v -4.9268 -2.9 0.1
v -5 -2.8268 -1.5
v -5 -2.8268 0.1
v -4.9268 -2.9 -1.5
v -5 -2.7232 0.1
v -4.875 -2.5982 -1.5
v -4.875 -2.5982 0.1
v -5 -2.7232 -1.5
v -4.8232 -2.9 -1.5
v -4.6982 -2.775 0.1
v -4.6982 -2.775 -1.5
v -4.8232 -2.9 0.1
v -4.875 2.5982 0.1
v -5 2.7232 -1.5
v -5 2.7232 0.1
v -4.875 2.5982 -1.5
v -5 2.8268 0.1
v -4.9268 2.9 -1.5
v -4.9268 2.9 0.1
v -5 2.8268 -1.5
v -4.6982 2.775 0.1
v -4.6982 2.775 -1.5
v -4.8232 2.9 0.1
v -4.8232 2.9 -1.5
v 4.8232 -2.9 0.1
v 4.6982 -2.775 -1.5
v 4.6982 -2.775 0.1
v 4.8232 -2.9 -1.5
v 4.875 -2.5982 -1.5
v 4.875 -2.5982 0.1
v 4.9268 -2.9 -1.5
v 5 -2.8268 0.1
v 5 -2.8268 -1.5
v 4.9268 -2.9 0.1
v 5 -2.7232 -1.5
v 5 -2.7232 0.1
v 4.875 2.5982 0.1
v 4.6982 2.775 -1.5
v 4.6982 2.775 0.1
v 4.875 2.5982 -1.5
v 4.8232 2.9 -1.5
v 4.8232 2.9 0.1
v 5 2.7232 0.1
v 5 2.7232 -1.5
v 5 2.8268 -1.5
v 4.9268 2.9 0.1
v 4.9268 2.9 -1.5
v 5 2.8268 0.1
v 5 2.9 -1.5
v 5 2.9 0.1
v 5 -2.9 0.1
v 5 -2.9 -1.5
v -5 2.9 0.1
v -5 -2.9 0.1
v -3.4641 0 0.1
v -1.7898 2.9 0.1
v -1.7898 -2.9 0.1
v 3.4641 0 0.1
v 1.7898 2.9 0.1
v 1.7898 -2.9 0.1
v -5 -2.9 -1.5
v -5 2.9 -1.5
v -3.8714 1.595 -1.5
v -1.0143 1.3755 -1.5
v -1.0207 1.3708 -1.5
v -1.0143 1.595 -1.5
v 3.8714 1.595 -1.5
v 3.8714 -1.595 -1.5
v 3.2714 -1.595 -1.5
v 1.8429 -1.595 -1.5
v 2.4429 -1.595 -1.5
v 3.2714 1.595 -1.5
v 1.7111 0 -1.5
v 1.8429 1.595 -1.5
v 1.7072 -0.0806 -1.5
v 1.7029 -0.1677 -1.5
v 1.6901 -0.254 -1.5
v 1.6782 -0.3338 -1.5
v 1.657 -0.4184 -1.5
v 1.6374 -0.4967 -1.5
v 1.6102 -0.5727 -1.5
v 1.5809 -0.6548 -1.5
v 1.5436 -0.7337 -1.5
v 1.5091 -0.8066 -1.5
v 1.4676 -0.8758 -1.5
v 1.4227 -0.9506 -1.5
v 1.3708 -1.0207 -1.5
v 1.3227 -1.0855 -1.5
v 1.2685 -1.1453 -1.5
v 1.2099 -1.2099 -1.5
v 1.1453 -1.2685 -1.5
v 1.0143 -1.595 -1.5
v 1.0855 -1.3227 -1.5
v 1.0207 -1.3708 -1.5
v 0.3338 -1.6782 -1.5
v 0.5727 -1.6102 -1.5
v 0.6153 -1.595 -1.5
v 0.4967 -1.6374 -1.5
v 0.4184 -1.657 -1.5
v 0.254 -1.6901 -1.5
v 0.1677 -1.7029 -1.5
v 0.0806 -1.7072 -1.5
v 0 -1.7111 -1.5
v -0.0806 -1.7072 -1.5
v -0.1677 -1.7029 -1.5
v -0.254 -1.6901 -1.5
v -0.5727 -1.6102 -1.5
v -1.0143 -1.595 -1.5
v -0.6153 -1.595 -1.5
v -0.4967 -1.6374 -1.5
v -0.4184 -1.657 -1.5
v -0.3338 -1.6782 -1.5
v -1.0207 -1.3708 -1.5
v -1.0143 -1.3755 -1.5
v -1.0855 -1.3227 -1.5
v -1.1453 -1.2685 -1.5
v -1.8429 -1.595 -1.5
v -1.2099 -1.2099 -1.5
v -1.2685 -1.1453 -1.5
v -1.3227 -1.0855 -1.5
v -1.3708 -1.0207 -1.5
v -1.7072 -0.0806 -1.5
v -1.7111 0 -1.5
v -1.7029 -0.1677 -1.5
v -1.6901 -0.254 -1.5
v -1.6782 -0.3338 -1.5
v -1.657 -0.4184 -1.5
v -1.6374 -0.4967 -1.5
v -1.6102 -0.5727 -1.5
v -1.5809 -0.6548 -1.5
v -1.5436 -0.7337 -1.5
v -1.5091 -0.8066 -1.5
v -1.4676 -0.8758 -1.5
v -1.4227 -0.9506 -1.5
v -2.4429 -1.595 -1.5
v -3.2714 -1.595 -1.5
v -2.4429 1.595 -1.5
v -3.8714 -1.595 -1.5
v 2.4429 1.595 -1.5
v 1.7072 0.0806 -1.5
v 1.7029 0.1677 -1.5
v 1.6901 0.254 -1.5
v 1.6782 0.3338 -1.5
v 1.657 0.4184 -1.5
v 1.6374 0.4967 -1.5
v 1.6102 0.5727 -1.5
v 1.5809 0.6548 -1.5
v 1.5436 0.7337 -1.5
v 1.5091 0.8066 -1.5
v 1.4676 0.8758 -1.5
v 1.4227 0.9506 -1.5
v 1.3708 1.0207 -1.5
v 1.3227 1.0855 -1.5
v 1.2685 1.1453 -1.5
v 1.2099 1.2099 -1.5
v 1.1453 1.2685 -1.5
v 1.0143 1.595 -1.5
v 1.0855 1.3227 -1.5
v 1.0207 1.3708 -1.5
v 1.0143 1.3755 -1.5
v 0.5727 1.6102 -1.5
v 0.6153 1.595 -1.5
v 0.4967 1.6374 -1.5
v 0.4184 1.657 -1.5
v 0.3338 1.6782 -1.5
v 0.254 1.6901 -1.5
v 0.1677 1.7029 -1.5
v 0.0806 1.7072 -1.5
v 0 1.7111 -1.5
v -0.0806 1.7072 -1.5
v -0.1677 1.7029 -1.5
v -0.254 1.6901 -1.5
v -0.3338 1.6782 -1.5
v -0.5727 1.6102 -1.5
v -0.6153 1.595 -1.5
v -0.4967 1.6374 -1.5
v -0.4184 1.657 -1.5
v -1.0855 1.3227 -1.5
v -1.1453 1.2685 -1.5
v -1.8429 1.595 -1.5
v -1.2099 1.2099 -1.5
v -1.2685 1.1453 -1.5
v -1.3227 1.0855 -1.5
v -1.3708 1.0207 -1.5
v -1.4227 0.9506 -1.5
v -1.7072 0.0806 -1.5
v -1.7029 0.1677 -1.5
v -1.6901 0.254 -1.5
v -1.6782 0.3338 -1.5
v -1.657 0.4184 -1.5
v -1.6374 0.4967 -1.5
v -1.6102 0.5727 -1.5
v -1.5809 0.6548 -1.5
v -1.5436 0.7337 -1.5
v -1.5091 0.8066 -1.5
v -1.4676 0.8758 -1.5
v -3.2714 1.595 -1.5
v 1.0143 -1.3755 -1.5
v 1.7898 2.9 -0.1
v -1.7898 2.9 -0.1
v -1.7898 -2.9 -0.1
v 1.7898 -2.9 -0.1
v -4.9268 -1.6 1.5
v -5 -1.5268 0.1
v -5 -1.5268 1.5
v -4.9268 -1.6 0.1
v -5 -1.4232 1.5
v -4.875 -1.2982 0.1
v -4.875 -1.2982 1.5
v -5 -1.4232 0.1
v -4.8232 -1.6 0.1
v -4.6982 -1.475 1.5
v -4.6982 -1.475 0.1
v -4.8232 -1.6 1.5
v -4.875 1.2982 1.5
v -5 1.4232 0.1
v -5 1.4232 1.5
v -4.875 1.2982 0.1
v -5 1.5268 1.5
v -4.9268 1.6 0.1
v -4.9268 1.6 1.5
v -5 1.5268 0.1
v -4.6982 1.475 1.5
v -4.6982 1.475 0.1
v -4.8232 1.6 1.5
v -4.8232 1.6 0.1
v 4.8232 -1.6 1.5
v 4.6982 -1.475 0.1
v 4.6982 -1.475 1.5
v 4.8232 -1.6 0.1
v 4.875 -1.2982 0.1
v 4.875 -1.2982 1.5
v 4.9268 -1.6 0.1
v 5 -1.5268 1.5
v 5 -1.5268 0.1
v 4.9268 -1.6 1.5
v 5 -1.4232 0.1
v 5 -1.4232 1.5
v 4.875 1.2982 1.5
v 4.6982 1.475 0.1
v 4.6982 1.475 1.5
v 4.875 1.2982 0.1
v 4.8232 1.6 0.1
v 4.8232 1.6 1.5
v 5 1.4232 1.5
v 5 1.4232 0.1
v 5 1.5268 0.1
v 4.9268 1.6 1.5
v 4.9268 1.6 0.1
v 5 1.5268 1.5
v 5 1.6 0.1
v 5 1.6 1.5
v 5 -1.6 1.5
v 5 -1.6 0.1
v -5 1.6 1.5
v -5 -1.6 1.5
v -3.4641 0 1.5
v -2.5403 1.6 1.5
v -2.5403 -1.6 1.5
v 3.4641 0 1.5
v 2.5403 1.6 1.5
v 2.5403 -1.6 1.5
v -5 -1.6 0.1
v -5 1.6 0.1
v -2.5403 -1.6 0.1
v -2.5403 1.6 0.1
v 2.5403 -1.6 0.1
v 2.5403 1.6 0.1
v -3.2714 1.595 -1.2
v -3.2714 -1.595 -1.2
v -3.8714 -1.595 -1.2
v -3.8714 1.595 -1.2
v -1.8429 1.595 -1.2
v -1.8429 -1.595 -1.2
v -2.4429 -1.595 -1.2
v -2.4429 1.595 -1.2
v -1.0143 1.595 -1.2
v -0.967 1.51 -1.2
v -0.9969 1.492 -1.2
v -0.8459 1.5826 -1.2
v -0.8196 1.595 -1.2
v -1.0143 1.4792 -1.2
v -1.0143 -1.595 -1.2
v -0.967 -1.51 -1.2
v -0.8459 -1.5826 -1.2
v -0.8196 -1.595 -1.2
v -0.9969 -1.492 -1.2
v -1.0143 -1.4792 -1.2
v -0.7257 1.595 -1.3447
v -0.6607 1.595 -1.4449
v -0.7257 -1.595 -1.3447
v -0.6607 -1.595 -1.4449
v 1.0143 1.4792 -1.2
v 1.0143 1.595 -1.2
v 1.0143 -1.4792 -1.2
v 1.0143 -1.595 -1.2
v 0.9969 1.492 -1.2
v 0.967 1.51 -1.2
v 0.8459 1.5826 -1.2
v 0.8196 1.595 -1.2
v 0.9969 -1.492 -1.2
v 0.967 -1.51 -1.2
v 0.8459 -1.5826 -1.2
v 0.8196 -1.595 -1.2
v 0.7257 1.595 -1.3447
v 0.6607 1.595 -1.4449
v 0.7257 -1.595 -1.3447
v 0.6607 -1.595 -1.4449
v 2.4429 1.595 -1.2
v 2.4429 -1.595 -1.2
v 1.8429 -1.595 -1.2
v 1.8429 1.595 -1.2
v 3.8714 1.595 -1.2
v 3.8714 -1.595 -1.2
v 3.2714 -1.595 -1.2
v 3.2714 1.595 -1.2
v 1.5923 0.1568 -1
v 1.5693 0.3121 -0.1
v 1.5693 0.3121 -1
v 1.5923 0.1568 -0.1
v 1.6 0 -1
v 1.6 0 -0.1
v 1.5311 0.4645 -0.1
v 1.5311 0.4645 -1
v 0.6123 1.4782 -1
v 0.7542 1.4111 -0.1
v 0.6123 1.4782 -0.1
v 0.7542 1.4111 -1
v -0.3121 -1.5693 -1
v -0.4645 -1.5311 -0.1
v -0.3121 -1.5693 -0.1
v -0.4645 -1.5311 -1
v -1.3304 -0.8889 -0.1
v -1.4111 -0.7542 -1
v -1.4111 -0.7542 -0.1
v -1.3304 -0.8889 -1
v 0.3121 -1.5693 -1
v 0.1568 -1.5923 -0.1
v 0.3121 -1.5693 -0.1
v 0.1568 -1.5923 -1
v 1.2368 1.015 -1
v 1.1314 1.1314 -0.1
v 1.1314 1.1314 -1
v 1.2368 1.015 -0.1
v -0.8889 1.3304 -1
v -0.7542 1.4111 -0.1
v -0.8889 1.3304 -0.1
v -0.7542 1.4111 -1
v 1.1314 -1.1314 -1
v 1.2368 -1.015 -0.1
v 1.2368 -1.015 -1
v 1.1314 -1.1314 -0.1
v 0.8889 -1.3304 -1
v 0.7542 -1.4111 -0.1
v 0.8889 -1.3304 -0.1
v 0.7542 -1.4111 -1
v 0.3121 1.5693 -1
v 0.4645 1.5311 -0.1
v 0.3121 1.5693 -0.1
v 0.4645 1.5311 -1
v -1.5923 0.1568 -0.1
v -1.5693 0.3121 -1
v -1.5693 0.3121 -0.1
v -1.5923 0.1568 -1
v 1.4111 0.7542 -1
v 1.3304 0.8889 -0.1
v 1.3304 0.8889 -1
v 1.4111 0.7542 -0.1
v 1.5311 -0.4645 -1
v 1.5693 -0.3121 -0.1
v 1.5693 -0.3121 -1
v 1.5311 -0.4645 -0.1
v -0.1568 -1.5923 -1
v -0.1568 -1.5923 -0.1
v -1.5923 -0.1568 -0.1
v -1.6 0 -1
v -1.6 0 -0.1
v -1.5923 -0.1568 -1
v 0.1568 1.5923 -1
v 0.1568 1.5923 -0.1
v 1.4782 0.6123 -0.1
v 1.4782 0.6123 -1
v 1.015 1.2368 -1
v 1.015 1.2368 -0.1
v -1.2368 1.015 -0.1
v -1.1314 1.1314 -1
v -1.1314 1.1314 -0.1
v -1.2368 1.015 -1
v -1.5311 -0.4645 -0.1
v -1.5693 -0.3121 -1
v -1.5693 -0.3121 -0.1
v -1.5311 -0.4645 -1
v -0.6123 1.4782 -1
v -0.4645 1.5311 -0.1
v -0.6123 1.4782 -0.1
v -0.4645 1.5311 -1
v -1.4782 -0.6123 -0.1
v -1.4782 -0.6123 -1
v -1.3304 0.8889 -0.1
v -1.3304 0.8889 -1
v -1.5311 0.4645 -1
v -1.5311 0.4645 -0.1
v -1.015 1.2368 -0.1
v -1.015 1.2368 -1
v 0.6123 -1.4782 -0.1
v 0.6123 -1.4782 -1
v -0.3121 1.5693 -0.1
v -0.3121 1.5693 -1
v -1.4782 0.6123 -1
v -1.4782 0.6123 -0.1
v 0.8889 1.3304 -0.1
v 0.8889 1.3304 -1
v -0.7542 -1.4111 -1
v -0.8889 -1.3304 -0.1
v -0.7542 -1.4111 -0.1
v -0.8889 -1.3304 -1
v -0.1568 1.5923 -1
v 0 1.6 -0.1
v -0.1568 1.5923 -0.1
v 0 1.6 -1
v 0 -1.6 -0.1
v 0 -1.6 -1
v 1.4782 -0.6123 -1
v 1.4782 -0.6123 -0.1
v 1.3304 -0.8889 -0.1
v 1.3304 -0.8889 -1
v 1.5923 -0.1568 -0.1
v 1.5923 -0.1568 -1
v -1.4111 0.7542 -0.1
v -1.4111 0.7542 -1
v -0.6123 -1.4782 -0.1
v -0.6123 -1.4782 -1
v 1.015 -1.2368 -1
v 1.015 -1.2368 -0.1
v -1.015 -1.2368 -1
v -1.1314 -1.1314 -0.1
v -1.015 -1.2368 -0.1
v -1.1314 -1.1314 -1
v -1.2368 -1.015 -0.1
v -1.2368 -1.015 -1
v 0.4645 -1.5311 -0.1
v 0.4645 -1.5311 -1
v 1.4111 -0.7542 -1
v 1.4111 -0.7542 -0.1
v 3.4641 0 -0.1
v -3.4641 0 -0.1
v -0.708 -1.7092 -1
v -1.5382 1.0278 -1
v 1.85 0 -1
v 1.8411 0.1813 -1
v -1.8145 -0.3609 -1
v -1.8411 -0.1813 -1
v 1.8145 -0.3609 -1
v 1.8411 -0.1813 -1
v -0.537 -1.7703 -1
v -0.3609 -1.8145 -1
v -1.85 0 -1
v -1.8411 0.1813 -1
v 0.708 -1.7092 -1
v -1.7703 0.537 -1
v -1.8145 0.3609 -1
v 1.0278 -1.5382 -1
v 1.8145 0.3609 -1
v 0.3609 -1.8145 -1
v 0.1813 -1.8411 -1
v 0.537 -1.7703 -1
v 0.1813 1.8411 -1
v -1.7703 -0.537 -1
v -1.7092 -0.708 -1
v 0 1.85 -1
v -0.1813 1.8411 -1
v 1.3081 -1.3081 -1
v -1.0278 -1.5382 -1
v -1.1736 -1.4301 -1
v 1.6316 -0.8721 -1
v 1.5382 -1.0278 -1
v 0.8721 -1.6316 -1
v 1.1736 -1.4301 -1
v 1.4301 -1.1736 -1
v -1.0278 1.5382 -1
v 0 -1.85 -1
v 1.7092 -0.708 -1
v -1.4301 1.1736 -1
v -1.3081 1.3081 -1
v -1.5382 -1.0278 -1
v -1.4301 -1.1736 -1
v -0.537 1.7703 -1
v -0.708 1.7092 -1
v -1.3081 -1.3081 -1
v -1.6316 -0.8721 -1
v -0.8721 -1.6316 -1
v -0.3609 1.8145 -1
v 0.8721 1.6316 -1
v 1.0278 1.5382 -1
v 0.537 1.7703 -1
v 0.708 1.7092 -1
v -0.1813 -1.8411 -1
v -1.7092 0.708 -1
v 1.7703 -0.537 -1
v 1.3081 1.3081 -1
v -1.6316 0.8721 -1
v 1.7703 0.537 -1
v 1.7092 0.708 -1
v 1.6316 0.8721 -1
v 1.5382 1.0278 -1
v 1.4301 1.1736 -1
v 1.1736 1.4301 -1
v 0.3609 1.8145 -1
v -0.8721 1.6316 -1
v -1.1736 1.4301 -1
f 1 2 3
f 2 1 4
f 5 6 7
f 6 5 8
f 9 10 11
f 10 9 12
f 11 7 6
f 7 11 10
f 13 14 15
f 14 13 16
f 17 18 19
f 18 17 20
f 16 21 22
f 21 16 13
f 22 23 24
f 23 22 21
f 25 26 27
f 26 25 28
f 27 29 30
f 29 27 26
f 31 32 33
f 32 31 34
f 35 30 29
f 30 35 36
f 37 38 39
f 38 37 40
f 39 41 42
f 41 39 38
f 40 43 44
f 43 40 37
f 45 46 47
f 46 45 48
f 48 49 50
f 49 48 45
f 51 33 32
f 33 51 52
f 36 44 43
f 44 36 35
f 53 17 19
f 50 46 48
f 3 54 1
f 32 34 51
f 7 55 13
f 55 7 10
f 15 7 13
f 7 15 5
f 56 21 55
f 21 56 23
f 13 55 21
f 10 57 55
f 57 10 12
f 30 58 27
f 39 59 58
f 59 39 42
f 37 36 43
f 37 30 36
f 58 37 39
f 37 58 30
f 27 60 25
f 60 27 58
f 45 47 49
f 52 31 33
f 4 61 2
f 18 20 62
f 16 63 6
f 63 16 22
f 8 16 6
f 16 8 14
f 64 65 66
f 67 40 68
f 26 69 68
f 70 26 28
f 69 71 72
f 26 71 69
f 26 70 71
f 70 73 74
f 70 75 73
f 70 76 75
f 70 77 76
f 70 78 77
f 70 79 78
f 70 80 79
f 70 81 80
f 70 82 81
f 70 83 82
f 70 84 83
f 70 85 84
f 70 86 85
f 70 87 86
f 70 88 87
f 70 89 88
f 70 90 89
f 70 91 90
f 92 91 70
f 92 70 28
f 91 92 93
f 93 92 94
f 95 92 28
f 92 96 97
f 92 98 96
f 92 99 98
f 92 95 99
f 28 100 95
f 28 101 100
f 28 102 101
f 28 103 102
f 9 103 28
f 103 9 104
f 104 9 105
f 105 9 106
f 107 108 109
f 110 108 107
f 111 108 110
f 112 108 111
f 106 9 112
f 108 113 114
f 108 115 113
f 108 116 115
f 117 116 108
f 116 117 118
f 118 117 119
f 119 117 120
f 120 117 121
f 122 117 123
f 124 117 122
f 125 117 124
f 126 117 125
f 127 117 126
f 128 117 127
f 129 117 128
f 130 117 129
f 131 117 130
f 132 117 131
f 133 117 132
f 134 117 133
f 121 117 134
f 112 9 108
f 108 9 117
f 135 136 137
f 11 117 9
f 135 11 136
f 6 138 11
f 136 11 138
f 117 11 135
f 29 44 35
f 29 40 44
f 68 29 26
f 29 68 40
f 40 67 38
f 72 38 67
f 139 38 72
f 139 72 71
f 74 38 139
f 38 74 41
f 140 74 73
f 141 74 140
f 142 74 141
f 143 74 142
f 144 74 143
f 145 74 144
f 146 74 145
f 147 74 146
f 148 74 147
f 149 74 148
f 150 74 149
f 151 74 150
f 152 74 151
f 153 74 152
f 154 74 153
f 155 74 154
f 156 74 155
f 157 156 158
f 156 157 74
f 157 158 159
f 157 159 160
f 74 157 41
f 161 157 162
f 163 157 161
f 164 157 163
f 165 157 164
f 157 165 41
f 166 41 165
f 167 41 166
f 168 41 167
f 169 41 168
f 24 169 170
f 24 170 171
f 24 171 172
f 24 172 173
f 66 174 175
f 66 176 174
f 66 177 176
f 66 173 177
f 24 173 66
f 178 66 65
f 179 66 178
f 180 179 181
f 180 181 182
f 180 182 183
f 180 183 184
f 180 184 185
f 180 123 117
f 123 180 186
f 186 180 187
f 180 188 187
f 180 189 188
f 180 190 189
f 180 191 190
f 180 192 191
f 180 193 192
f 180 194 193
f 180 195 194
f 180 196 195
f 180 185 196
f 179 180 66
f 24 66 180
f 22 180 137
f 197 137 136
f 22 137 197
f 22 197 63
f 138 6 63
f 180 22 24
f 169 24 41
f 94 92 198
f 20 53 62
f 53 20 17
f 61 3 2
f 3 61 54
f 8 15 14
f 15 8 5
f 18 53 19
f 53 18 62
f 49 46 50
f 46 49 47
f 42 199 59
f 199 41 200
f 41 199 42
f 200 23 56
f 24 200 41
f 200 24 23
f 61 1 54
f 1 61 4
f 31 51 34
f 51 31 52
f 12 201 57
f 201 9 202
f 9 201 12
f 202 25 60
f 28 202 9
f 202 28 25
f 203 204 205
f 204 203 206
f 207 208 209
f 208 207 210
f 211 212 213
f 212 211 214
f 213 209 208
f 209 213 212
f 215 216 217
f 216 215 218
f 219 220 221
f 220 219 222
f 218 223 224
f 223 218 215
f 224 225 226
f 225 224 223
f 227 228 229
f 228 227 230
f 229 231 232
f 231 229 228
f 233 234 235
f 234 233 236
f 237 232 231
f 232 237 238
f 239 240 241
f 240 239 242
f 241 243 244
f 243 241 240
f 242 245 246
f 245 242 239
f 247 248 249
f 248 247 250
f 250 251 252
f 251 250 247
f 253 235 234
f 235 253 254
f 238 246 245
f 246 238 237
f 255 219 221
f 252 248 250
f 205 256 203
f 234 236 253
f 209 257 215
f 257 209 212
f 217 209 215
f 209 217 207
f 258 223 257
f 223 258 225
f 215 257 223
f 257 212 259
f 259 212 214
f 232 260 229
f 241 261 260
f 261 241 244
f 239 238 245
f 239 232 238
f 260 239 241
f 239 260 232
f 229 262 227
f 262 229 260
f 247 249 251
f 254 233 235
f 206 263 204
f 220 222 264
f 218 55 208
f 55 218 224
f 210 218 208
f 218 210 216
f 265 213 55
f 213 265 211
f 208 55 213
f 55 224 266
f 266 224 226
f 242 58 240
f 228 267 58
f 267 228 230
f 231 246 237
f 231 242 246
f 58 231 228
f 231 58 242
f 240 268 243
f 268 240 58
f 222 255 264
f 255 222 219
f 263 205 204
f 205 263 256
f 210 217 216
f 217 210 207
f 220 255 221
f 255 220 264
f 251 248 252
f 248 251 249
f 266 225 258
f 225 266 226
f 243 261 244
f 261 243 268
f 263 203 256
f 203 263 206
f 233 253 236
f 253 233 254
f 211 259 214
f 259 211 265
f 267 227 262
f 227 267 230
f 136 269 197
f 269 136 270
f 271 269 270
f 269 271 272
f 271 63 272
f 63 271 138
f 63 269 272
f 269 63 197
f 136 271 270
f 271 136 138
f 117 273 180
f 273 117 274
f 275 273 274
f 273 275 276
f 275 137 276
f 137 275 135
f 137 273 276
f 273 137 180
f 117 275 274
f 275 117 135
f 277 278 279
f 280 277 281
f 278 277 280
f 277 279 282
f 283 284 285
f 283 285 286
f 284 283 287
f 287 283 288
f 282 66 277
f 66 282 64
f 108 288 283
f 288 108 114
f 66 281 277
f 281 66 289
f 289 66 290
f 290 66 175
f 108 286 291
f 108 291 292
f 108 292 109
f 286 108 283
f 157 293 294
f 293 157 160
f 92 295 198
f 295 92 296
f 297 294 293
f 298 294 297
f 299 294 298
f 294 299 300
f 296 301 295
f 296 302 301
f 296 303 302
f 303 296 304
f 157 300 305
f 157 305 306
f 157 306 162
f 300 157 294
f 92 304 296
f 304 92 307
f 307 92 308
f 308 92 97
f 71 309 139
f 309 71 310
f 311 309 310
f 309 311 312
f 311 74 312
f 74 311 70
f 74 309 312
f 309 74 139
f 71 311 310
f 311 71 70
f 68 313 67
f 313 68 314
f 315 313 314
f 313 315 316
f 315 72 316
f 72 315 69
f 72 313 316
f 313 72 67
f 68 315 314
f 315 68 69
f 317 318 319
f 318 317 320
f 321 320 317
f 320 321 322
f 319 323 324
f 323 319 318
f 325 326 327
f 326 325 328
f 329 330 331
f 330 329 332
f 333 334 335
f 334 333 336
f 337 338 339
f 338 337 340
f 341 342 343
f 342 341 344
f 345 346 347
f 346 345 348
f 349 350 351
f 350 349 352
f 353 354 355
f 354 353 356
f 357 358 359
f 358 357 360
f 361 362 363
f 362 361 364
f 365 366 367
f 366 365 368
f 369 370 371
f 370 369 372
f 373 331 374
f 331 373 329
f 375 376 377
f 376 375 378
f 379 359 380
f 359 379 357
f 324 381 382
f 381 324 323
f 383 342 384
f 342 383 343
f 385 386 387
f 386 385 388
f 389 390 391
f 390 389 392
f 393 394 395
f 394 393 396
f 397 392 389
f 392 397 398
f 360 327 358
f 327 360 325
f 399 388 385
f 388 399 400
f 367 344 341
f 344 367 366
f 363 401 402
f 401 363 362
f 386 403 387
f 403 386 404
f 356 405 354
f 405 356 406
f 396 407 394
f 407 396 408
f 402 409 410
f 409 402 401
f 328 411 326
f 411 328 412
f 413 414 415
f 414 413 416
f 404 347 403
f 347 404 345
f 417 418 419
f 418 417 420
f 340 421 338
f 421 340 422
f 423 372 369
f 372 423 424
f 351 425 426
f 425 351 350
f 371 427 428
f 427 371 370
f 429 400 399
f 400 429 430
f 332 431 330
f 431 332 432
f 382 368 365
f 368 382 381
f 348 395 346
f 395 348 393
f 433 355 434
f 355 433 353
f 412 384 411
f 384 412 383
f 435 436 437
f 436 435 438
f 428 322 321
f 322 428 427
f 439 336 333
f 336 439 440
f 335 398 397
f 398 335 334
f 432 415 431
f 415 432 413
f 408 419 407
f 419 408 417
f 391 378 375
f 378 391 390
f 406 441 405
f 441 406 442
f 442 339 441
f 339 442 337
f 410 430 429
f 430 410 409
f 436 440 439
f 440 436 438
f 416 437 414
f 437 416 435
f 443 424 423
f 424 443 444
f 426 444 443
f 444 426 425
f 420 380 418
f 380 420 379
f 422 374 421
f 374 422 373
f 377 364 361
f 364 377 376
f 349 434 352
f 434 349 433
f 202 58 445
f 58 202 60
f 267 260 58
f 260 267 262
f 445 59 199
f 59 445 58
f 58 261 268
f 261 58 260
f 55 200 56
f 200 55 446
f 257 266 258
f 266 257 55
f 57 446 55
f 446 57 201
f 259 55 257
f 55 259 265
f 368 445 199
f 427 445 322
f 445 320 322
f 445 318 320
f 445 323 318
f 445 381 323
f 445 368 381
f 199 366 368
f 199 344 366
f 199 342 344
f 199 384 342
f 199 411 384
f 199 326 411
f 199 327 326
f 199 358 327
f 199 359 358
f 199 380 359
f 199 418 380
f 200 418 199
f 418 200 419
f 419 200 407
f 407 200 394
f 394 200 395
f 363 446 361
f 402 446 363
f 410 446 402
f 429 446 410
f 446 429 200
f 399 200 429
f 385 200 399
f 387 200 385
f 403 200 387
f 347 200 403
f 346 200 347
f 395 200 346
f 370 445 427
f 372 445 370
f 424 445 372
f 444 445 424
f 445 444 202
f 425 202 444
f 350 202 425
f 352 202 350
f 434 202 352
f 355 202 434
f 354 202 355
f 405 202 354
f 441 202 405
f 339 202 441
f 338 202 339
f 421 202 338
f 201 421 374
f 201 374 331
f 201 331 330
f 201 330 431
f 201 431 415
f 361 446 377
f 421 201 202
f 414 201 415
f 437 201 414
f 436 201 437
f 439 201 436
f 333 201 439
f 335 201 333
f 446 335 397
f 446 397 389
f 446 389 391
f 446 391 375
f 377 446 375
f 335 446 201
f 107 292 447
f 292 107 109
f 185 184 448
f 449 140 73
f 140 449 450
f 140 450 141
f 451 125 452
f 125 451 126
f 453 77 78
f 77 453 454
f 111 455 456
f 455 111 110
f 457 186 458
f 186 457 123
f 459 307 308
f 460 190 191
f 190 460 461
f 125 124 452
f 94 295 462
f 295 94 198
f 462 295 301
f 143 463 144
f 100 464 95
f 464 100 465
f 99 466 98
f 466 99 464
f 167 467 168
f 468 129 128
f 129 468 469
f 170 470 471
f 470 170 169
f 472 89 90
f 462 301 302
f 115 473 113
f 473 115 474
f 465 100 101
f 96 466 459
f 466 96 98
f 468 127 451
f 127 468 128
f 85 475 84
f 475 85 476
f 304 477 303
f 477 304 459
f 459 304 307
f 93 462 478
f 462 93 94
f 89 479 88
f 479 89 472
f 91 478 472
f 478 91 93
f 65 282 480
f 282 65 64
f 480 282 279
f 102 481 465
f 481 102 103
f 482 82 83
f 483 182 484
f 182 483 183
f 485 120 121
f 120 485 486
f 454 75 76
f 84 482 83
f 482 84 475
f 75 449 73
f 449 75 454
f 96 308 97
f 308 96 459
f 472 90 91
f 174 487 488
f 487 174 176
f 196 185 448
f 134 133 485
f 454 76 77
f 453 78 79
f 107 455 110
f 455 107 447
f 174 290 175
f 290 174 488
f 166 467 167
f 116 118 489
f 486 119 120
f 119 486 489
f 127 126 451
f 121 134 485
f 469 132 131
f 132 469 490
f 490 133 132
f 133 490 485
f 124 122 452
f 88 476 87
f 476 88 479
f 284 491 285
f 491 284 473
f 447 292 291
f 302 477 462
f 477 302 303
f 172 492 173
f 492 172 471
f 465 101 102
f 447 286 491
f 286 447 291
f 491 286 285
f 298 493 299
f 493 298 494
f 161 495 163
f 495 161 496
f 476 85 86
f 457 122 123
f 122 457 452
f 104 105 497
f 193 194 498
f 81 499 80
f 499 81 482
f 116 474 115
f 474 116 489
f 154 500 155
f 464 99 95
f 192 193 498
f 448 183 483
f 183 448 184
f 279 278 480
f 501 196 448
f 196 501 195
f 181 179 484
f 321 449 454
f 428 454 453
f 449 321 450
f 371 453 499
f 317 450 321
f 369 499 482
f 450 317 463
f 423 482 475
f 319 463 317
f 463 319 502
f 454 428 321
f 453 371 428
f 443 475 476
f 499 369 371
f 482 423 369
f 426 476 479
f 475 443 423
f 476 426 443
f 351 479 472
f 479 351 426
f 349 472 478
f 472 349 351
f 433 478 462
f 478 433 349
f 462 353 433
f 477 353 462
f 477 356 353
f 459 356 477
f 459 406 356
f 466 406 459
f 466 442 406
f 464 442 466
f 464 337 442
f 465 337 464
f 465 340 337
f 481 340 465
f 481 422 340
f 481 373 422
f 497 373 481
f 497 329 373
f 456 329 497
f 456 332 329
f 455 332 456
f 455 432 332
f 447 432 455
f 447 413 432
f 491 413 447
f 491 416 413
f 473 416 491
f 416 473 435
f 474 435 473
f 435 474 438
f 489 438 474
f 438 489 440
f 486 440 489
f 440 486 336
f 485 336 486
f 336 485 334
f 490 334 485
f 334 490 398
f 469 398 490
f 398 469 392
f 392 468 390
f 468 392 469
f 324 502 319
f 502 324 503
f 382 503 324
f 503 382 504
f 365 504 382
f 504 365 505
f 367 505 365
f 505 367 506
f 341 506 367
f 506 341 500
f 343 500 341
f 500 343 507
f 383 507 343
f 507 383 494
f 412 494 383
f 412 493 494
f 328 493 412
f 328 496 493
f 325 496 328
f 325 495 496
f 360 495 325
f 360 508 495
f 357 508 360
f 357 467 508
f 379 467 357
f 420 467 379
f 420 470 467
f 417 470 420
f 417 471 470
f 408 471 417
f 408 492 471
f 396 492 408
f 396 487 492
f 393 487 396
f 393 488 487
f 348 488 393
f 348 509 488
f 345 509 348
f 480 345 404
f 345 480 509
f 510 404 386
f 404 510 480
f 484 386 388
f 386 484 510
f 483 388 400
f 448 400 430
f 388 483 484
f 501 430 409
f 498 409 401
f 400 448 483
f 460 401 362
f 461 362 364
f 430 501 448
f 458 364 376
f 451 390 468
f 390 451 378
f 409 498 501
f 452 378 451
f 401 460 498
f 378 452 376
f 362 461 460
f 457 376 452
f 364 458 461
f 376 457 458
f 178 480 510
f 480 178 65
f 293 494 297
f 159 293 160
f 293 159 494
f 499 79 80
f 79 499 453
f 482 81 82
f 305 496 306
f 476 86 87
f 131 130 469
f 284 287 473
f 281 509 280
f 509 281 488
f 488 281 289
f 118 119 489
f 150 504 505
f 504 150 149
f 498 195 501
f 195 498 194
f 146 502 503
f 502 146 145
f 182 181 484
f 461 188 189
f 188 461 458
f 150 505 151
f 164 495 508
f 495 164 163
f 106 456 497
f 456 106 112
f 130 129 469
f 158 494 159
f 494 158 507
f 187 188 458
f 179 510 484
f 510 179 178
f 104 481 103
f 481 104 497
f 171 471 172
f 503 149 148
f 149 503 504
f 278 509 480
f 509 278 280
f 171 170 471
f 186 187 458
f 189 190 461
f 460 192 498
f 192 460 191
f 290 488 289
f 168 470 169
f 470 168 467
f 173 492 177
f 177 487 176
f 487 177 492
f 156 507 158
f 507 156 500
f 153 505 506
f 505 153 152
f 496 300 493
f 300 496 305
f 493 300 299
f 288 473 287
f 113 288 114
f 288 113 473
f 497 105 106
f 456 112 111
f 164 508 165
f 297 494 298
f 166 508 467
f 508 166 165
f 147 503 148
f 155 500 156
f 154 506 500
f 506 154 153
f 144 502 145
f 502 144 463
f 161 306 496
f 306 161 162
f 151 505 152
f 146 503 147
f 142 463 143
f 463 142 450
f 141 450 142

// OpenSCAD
$fn = 64;

// ===== Target dimensions =====
thickness      = 3.0;   // overall thickness (Z)
across_flats   = 6.0;   // hex pocket across flats (driver/nut) (mm)
screw_diameter = 3.0;   // nominal screw size (M3 reference)
hole_diameter  = 3.2;   // M3 clearance hole (mm)

// ===== T-slot nut body (typical 2020/3030 style) =====
body_length   = 10.0;   // along slot (X)
t_head_width  = 5.8;    // undercut capture width (Y) - bottom "head"
t_neck_width  = 3.2;    // slot opening width (Y) - top "neck"
t_head_height = 1.6;    // bottom head height (Z)
t_neck_height = thickness - t_head_height;

// ===== Details =====
chamfer = 0.25;         // small edge chamfer
overlap = 0.20;         // boolean overlap

// Optional spring bump (keeps nut from sliding in slot)
spring_bump_height = 0.45;
spring_bump_radius = 0.90;

// Optional underside serrations (anti-rotation)
serration_count = 6;
serration_depth = 0.30;
serration_width = 0.60;

// Helpers
function hex_R_from_AF(af) = af / sqrt(3); // circumradius from across-flats

module chamfered_block(size=[10,6,3], ch=0.25) {
    // Chamfer by subtracting 45° wedges on all 4 vertical edges
    difference() {
        cube(size, center=true);
        for (sx=[-1,1], sy=[-1,1]) {
            translate([sx*(size[0]/2 - ch/2), sy*(size[1]/2 - ch/2), 0])
                rotate([0,0,45])
                    cube([ch, ch, size[2] + 2*overlap], center=true);
        }
    }
}

module t_profile_body() {
    // One connected solid: neck sits on head (T-shape in YZ)
    union() {
        // Bottom head (captures under slot lips)
        translate([0, 0, -thickness/2 + t_head_height/2])
            chamfered_block([body_length, t_head_width, t_head_height], chamfer);

        // Top neck (fits slot opening)
        translate([0, 0,  thickness/2 - t_neck_height/2])
            chamfered_block([body_length, t_neck_width, t_neck_height], chamfer);
    }
}

module t_slot_nut() {
    difference() {
        union() {
            // Main T-slot nut body
            t_profile_body();

            // Spring bump on top face (connected with overlap)
            translate([0, 0, thickness/2 + spring_bump_height - spring_bump_radius - overlap])
                sphere(r=spring_bump_radius);
        }

        // Through hole for M3 clearance
        cylinder(d=hole_diameter,
                 h=thickness + 2*(spring_bump_height + spring_bump_radius + 2*overlap),
                 center=true);

        // Hex driver pocket on top face (6.0mm across flats)
        hex_depth = min(1.6, thickness - 0.6);
        translate([0, 0, thickness/2 - hex_depth/2 + overlap])
            cylinder(r=hex_R_from_AF(across_flats),
                     h=hex_depth + 2*overlap,
                     center=true, $fn=6);

        // Hole entry chamfers (top and bottom)
        chamfer_h = min(0.5, thickness/2);
        translate([0, 0,  thickness/2 - chamfer_h/2 + overlap])
            cylinder(d1=hole_diameter + 2*chamfer, d2=hole_diameter,
                     h=chamfer_h + 2*overlap, center=true);
        translate([0, 0, -thickness/2 + chamfer_h/2 - overlap])
            cylinder(d1=hole_diameter, d2=hole_diameter + 2*chamfer,
                     h=chamfer_h + 2*overlap, center=true);

        // Underside serrations on the head (bite into extrusion)
        for (i = [1:serration_count]) {
            x_pos = -body_length/2 + (body_length/(serration_count+1))*i;
            translate([x_pos, 0, -thickness/2 + serration_depth/2 - overlap])
                cube([serration_width, t_head_width*0.55, serration_depth + 2*overlap], center=true);
        }
    }
}

t_slot_nut();
